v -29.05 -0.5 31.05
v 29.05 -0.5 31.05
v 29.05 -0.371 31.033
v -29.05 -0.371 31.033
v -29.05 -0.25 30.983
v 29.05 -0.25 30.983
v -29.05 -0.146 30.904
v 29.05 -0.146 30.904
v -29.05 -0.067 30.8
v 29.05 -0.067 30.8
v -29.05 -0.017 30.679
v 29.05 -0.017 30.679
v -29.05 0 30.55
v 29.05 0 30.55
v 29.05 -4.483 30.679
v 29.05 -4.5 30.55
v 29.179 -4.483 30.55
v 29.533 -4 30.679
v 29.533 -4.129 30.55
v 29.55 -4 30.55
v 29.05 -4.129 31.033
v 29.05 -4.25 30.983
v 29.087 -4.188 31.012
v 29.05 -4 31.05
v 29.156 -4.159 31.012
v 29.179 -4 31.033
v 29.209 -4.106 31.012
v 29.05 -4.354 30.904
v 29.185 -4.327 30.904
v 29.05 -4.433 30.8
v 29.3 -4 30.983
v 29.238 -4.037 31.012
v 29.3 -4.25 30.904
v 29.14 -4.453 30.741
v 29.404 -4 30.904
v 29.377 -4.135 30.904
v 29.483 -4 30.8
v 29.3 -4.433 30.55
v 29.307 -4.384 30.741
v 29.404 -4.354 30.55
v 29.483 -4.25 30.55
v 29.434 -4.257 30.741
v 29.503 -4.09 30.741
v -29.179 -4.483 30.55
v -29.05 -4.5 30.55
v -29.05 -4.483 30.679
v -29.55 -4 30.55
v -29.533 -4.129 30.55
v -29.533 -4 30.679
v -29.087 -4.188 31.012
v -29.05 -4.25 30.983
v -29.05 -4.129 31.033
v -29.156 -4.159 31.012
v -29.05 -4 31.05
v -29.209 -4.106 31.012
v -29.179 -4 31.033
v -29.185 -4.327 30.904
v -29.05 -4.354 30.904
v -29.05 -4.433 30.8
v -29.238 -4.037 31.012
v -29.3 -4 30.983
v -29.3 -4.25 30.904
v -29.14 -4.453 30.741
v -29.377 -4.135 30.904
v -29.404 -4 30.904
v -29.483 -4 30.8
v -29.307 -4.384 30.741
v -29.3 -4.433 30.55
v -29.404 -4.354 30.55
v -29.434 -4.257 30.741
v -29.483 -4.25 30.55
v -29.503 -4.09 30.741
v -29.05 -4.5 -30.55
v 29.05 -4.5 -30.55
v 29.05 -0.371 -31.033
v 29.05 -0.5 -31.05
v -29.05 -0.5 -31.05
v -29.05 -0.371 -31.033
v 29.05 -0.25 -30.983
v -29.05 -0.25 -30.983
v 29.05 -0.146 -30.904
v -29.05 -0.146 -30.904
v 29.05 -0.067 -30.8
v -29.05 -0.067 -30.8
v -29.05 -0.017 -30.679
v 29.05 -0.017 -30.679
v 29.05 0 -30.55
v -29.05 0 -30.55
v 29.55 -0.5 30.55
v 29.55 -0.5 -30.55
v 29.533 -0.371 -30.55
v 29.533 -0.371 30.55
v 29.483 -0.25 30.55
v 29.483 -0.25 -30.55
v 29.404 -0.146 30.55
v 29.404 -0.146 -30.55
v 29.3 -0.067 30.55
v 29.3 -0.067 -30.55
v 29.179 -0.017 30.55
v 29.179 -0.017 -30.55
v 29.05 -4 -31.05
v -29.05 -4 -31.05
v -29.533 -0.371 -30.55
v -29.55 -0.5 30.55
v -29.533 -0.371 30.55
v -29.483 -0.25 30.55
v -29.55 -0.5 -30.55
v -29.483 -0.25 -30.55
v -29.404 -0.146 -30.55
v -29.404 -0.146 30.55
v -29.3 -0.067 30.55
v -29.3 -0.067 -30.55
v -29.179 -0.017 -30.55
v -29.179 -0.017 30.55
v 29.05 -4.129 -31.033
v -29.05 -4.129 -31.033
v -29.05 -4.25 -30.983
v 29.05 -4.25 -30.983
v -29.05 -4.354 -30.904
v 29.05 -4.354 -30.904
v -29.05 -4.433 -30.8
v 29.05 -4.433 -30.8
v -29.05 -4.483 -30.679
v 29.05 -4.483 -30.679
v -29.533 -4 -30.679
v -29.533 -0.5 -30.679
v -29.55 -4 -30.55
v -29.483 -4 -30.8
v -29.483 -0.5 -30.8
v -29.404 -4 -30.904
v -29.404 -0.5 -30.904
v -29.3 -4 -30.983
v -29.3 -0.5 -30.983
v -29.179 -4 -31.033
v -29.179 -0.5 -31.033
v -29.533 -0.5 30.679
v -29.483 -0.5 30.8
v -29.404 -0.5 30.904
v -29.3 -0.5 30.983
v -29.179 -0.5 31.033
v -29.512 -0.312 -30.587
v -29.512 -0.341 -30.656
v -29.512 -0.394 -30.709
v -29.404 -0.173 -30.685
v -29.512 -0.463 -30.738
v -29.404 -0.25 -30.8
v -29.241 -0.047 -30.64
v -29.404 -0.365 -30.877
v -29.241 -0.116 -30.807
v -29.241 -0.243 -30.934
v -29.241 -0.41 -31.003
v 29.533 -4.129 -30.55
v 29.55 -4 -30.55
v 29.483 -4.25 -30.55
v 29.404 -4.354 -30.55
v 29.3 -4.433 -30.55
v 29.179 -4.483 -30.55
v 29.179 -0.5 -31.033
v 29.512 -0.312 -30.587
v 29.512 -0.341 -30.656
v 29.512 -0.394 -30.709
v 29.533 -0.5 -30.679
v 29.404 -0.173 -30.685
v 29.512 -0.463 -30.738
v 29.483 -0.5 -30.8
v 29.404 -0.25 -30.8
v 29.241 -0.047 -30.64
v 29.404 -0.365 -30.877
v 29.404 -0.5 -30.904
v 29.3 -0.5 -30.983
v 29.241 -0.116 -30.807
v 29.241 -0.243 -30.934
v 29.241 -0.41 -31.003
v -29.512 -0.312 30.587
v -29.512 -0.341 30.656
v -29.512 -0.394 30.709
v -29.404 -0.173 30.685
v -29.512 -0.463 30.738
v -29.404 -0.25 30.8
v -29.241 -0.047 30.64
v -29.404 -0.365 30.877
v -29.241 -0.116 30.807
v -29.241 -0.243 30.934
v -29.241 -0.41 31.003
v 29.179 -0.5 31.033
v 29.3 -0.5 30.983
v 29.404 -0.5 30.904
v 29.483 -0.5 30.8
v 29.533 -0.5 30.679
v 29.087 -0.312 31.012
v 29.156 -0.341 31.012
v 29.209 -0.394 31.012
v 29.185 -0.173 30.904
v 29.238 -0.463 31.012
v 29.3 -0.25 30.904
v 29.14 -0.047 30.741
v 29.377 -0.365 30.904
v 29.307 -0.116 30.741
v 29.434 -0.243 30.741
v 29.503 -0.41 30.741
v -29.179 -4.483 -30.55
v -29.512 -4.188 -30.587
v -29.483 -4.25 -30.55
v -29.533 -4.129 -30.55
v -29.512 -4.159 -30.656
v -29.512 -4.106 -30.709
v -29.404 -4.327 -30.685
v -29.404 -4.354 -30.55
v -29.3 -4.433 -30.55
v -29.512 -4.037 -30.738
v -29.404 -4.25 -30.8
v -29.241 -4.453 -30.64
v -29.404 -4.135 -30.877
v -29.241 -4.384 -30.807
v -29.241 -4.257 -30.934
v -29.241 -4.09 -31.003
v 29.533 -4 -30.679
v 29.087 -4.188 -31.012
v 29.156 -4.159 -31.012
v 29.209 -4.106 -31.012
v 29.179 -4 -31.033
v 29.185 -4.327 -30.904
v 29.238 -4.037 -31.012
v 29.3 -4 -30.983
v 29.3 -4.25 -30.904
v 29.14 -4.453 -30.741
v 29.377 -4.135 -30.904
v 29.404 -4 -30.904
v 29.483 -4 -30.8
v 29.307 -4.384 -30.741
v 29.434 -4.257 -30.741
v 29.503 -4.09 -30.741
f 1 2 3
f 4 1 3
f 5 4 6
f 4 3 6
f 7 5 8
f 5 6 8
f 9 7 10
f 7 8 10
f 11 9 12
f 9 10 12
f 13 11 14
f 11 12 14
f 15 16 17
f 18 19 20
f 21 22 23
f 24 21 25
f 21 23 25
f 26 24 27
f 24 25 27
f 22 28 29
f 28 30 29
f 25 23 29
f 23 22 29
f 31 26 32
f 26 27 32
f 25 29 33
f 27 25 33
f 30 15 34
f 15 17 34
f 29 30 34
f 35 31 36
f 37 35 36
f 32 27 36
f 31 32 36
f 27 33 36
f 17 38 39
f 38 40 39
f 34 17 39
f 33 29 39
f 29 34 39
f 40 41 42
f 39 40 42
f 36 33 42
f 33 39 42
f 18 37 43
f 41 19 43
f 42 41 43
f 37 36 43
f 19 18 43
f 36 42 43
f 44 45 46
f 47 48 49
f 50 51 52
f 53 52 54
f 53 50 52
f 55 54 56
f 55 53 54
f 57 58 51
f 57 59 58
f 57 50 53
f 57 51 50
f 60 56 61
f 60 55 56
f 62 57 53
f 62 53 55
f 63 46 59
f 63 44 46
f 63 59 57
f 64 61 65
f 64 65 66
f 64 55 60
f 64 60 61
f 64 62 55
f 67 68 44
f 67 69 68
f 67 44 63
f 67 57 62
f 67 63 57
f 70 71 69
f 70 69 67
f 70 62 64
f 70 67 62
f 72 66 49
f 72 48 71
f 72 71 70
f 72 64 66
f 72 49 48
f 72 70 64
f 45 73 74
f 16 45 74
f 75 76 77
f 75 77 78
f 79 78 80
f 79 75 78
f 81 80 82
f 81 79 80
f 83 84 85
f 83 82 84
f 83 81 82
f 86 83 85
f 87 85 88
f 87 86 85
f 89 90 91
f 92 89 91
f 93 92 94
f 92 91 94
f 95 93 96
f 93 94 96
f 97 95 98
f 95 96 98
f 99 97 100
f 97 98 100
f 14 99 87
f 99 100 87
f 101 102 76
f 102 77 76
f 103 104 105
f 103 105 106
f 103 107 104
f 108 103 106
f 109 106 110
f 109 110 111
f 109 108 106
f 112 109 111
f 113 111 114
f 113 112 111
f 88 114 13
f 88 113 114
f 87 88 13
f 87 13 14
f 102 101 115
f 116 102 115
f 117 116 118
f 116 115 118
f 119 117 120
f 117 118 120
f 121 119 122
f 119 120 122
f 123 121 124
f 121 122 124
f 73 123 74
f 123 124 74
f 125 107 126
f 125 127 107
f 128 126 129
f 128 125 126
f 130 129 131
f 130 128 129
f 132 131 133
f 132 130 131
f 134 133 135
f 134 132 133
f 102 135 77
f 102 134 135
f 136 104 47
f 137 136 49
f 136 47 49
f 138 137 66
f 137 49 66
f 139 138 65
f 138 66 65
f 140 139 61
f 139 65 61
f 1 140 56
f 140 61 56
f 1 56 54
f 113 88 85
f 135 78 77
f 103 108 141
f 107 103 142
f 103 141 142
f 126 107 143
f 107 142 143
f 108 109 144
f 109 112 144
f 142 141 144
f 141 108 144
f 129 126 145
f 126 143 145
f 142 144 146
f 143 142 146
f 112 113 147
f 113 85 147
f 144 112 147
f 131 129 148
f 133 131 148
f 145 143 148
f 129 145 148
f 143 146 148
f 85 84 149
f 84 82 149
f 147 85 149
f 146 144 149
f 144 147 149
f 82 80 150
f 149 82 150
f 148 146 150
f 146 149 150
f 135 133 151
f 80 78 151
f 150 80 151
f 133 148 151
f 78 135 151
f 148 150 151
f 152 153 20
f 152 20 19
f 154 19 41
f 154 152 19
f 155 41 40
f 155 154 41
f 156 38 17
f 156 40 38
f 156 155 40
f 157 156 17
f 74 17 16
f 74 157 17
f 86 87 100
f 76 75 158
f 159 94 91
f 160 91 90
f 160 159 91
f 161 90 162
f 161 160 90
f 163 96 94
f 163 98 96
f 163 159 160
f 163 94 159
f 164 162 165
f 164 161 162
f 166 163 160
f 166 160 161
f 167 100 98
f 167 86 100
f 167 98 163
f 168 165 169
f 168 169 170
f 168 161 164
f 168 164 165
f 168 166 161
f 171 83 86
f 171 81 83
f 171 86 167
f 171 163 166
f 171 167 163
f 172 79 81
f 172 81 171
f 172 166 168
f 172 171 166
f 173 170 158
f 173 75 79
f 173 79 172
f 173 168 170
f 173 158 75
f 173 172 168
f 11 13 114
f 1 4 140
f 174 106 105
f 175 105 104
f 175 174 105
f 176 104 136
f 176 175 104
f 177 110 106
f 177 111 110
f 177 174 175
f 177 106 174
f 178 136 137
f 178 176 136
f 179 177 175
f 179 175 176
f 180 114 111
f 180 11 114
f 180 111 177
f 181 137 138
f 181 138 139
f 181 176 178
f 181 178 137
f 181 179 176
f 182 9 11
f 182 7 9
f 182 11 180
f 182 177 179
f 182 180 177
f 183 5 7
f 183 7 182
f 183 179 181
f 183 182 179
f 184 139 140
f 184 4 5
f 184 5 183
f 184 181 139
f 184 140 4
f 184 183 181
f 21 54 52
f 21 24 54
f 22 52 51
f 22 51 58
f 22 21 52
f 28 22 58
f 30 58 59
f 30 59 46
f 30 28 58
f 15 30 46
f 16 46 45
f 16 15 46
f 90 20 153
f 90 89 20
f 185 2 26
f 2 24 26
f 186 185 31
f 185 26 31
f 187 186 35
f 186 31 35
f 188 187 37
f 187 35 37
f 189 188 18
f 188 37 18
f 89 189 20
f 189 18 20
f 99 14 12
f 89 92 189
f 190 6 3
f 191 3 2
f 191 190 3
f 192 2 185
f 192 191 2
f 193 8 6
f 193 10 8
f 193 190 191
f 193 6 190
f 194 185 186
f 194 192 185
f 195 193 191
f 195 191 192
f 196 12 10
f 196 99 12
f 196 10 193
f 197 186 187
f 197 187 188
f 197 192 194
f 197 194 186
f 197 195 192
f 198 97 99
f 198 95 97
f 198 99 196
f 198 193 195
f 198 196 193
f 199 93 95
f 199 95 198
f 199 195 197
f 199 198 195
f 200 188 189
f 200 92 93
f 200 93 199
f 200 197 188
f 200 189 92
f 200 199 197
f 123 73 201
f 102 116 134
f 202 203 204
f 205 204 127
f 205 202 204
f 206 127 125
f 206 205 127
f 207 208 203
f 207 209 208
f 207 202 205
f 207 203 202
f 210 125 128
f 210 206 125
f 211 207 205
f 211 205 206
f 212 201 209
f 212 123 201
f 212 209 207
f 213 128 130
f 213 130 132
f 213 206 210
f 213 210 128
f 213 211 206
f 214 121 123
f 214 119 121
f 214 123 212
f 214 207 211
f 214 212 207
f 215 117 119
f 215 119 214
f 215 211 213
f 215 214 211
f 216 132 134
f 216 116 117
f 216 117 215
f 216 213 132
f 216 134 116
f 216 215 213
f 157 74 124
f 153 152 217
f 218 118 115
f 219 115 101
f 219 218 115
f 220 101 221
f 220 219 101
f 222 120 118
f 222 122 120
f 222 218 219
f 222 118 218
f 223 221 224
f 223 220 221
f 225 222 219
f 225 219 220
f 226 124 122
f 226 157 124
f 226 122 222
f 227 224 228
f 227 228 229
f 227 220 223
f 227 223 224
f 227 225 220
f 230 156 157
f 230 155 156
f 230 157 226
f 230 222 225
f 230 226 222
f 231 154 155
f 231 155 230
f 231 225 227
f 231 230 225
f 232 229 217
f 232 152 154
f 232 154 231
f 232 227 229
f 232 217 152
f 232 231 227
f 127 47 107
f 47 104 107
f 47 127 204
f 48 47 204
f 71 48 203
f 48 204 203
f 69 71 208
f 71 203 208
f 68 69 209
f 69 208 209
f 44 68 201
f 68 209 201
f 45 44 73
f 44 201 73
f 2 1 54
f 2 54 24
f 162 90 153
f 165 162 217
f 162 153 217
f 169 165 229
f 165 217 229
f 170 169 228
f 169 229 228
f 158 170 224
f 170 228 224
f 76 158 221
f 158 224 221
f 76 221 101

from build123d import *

# Parameters (mm, degrees)
SKETCH_1_W      = 59.1
SKETCH_1_H      = 62.1
EXTRUDE_1_DEPTH = 4.5
FILLET_1_R      = 0.5


with BuildPart() as part:
    # 스케치1 → 보스-돌출1 (new body)
    with BuildSketch(Plane(origin=(0, 0, 0), x_dir=(1, 0, 0), z_dir=(0, 1, 0))):
        Rectangle(SKETCH_1_W, SKETCH_1_H)
    extrude(amount=-EXTRUDE_1_DEPTH)

    # 필렛1
    fillet_1_edges = [part.edges().sort_by_distance(p)[0] for p in [
        (29.55, -4.5, 0),
        (0, -4.5, -31.05),
        (-29.55, -4.5, 0),
        (0, 0, -31.05),
        (29.55, 0, 0),
        (0, 0, 31.05),
        (-29.55, 0, 0),
        (0, -4.5, 31.05),
        (-29.55, -2.25, -31.05),
        (29.55, -2.25, -31.05),
        (29.55, -2.25, 31.05),
        (-29.55, -2.25, 31.05),
    ]]
    fillet(fillet_1_edges, radius=FILLET_1_R)


solid = part.part
